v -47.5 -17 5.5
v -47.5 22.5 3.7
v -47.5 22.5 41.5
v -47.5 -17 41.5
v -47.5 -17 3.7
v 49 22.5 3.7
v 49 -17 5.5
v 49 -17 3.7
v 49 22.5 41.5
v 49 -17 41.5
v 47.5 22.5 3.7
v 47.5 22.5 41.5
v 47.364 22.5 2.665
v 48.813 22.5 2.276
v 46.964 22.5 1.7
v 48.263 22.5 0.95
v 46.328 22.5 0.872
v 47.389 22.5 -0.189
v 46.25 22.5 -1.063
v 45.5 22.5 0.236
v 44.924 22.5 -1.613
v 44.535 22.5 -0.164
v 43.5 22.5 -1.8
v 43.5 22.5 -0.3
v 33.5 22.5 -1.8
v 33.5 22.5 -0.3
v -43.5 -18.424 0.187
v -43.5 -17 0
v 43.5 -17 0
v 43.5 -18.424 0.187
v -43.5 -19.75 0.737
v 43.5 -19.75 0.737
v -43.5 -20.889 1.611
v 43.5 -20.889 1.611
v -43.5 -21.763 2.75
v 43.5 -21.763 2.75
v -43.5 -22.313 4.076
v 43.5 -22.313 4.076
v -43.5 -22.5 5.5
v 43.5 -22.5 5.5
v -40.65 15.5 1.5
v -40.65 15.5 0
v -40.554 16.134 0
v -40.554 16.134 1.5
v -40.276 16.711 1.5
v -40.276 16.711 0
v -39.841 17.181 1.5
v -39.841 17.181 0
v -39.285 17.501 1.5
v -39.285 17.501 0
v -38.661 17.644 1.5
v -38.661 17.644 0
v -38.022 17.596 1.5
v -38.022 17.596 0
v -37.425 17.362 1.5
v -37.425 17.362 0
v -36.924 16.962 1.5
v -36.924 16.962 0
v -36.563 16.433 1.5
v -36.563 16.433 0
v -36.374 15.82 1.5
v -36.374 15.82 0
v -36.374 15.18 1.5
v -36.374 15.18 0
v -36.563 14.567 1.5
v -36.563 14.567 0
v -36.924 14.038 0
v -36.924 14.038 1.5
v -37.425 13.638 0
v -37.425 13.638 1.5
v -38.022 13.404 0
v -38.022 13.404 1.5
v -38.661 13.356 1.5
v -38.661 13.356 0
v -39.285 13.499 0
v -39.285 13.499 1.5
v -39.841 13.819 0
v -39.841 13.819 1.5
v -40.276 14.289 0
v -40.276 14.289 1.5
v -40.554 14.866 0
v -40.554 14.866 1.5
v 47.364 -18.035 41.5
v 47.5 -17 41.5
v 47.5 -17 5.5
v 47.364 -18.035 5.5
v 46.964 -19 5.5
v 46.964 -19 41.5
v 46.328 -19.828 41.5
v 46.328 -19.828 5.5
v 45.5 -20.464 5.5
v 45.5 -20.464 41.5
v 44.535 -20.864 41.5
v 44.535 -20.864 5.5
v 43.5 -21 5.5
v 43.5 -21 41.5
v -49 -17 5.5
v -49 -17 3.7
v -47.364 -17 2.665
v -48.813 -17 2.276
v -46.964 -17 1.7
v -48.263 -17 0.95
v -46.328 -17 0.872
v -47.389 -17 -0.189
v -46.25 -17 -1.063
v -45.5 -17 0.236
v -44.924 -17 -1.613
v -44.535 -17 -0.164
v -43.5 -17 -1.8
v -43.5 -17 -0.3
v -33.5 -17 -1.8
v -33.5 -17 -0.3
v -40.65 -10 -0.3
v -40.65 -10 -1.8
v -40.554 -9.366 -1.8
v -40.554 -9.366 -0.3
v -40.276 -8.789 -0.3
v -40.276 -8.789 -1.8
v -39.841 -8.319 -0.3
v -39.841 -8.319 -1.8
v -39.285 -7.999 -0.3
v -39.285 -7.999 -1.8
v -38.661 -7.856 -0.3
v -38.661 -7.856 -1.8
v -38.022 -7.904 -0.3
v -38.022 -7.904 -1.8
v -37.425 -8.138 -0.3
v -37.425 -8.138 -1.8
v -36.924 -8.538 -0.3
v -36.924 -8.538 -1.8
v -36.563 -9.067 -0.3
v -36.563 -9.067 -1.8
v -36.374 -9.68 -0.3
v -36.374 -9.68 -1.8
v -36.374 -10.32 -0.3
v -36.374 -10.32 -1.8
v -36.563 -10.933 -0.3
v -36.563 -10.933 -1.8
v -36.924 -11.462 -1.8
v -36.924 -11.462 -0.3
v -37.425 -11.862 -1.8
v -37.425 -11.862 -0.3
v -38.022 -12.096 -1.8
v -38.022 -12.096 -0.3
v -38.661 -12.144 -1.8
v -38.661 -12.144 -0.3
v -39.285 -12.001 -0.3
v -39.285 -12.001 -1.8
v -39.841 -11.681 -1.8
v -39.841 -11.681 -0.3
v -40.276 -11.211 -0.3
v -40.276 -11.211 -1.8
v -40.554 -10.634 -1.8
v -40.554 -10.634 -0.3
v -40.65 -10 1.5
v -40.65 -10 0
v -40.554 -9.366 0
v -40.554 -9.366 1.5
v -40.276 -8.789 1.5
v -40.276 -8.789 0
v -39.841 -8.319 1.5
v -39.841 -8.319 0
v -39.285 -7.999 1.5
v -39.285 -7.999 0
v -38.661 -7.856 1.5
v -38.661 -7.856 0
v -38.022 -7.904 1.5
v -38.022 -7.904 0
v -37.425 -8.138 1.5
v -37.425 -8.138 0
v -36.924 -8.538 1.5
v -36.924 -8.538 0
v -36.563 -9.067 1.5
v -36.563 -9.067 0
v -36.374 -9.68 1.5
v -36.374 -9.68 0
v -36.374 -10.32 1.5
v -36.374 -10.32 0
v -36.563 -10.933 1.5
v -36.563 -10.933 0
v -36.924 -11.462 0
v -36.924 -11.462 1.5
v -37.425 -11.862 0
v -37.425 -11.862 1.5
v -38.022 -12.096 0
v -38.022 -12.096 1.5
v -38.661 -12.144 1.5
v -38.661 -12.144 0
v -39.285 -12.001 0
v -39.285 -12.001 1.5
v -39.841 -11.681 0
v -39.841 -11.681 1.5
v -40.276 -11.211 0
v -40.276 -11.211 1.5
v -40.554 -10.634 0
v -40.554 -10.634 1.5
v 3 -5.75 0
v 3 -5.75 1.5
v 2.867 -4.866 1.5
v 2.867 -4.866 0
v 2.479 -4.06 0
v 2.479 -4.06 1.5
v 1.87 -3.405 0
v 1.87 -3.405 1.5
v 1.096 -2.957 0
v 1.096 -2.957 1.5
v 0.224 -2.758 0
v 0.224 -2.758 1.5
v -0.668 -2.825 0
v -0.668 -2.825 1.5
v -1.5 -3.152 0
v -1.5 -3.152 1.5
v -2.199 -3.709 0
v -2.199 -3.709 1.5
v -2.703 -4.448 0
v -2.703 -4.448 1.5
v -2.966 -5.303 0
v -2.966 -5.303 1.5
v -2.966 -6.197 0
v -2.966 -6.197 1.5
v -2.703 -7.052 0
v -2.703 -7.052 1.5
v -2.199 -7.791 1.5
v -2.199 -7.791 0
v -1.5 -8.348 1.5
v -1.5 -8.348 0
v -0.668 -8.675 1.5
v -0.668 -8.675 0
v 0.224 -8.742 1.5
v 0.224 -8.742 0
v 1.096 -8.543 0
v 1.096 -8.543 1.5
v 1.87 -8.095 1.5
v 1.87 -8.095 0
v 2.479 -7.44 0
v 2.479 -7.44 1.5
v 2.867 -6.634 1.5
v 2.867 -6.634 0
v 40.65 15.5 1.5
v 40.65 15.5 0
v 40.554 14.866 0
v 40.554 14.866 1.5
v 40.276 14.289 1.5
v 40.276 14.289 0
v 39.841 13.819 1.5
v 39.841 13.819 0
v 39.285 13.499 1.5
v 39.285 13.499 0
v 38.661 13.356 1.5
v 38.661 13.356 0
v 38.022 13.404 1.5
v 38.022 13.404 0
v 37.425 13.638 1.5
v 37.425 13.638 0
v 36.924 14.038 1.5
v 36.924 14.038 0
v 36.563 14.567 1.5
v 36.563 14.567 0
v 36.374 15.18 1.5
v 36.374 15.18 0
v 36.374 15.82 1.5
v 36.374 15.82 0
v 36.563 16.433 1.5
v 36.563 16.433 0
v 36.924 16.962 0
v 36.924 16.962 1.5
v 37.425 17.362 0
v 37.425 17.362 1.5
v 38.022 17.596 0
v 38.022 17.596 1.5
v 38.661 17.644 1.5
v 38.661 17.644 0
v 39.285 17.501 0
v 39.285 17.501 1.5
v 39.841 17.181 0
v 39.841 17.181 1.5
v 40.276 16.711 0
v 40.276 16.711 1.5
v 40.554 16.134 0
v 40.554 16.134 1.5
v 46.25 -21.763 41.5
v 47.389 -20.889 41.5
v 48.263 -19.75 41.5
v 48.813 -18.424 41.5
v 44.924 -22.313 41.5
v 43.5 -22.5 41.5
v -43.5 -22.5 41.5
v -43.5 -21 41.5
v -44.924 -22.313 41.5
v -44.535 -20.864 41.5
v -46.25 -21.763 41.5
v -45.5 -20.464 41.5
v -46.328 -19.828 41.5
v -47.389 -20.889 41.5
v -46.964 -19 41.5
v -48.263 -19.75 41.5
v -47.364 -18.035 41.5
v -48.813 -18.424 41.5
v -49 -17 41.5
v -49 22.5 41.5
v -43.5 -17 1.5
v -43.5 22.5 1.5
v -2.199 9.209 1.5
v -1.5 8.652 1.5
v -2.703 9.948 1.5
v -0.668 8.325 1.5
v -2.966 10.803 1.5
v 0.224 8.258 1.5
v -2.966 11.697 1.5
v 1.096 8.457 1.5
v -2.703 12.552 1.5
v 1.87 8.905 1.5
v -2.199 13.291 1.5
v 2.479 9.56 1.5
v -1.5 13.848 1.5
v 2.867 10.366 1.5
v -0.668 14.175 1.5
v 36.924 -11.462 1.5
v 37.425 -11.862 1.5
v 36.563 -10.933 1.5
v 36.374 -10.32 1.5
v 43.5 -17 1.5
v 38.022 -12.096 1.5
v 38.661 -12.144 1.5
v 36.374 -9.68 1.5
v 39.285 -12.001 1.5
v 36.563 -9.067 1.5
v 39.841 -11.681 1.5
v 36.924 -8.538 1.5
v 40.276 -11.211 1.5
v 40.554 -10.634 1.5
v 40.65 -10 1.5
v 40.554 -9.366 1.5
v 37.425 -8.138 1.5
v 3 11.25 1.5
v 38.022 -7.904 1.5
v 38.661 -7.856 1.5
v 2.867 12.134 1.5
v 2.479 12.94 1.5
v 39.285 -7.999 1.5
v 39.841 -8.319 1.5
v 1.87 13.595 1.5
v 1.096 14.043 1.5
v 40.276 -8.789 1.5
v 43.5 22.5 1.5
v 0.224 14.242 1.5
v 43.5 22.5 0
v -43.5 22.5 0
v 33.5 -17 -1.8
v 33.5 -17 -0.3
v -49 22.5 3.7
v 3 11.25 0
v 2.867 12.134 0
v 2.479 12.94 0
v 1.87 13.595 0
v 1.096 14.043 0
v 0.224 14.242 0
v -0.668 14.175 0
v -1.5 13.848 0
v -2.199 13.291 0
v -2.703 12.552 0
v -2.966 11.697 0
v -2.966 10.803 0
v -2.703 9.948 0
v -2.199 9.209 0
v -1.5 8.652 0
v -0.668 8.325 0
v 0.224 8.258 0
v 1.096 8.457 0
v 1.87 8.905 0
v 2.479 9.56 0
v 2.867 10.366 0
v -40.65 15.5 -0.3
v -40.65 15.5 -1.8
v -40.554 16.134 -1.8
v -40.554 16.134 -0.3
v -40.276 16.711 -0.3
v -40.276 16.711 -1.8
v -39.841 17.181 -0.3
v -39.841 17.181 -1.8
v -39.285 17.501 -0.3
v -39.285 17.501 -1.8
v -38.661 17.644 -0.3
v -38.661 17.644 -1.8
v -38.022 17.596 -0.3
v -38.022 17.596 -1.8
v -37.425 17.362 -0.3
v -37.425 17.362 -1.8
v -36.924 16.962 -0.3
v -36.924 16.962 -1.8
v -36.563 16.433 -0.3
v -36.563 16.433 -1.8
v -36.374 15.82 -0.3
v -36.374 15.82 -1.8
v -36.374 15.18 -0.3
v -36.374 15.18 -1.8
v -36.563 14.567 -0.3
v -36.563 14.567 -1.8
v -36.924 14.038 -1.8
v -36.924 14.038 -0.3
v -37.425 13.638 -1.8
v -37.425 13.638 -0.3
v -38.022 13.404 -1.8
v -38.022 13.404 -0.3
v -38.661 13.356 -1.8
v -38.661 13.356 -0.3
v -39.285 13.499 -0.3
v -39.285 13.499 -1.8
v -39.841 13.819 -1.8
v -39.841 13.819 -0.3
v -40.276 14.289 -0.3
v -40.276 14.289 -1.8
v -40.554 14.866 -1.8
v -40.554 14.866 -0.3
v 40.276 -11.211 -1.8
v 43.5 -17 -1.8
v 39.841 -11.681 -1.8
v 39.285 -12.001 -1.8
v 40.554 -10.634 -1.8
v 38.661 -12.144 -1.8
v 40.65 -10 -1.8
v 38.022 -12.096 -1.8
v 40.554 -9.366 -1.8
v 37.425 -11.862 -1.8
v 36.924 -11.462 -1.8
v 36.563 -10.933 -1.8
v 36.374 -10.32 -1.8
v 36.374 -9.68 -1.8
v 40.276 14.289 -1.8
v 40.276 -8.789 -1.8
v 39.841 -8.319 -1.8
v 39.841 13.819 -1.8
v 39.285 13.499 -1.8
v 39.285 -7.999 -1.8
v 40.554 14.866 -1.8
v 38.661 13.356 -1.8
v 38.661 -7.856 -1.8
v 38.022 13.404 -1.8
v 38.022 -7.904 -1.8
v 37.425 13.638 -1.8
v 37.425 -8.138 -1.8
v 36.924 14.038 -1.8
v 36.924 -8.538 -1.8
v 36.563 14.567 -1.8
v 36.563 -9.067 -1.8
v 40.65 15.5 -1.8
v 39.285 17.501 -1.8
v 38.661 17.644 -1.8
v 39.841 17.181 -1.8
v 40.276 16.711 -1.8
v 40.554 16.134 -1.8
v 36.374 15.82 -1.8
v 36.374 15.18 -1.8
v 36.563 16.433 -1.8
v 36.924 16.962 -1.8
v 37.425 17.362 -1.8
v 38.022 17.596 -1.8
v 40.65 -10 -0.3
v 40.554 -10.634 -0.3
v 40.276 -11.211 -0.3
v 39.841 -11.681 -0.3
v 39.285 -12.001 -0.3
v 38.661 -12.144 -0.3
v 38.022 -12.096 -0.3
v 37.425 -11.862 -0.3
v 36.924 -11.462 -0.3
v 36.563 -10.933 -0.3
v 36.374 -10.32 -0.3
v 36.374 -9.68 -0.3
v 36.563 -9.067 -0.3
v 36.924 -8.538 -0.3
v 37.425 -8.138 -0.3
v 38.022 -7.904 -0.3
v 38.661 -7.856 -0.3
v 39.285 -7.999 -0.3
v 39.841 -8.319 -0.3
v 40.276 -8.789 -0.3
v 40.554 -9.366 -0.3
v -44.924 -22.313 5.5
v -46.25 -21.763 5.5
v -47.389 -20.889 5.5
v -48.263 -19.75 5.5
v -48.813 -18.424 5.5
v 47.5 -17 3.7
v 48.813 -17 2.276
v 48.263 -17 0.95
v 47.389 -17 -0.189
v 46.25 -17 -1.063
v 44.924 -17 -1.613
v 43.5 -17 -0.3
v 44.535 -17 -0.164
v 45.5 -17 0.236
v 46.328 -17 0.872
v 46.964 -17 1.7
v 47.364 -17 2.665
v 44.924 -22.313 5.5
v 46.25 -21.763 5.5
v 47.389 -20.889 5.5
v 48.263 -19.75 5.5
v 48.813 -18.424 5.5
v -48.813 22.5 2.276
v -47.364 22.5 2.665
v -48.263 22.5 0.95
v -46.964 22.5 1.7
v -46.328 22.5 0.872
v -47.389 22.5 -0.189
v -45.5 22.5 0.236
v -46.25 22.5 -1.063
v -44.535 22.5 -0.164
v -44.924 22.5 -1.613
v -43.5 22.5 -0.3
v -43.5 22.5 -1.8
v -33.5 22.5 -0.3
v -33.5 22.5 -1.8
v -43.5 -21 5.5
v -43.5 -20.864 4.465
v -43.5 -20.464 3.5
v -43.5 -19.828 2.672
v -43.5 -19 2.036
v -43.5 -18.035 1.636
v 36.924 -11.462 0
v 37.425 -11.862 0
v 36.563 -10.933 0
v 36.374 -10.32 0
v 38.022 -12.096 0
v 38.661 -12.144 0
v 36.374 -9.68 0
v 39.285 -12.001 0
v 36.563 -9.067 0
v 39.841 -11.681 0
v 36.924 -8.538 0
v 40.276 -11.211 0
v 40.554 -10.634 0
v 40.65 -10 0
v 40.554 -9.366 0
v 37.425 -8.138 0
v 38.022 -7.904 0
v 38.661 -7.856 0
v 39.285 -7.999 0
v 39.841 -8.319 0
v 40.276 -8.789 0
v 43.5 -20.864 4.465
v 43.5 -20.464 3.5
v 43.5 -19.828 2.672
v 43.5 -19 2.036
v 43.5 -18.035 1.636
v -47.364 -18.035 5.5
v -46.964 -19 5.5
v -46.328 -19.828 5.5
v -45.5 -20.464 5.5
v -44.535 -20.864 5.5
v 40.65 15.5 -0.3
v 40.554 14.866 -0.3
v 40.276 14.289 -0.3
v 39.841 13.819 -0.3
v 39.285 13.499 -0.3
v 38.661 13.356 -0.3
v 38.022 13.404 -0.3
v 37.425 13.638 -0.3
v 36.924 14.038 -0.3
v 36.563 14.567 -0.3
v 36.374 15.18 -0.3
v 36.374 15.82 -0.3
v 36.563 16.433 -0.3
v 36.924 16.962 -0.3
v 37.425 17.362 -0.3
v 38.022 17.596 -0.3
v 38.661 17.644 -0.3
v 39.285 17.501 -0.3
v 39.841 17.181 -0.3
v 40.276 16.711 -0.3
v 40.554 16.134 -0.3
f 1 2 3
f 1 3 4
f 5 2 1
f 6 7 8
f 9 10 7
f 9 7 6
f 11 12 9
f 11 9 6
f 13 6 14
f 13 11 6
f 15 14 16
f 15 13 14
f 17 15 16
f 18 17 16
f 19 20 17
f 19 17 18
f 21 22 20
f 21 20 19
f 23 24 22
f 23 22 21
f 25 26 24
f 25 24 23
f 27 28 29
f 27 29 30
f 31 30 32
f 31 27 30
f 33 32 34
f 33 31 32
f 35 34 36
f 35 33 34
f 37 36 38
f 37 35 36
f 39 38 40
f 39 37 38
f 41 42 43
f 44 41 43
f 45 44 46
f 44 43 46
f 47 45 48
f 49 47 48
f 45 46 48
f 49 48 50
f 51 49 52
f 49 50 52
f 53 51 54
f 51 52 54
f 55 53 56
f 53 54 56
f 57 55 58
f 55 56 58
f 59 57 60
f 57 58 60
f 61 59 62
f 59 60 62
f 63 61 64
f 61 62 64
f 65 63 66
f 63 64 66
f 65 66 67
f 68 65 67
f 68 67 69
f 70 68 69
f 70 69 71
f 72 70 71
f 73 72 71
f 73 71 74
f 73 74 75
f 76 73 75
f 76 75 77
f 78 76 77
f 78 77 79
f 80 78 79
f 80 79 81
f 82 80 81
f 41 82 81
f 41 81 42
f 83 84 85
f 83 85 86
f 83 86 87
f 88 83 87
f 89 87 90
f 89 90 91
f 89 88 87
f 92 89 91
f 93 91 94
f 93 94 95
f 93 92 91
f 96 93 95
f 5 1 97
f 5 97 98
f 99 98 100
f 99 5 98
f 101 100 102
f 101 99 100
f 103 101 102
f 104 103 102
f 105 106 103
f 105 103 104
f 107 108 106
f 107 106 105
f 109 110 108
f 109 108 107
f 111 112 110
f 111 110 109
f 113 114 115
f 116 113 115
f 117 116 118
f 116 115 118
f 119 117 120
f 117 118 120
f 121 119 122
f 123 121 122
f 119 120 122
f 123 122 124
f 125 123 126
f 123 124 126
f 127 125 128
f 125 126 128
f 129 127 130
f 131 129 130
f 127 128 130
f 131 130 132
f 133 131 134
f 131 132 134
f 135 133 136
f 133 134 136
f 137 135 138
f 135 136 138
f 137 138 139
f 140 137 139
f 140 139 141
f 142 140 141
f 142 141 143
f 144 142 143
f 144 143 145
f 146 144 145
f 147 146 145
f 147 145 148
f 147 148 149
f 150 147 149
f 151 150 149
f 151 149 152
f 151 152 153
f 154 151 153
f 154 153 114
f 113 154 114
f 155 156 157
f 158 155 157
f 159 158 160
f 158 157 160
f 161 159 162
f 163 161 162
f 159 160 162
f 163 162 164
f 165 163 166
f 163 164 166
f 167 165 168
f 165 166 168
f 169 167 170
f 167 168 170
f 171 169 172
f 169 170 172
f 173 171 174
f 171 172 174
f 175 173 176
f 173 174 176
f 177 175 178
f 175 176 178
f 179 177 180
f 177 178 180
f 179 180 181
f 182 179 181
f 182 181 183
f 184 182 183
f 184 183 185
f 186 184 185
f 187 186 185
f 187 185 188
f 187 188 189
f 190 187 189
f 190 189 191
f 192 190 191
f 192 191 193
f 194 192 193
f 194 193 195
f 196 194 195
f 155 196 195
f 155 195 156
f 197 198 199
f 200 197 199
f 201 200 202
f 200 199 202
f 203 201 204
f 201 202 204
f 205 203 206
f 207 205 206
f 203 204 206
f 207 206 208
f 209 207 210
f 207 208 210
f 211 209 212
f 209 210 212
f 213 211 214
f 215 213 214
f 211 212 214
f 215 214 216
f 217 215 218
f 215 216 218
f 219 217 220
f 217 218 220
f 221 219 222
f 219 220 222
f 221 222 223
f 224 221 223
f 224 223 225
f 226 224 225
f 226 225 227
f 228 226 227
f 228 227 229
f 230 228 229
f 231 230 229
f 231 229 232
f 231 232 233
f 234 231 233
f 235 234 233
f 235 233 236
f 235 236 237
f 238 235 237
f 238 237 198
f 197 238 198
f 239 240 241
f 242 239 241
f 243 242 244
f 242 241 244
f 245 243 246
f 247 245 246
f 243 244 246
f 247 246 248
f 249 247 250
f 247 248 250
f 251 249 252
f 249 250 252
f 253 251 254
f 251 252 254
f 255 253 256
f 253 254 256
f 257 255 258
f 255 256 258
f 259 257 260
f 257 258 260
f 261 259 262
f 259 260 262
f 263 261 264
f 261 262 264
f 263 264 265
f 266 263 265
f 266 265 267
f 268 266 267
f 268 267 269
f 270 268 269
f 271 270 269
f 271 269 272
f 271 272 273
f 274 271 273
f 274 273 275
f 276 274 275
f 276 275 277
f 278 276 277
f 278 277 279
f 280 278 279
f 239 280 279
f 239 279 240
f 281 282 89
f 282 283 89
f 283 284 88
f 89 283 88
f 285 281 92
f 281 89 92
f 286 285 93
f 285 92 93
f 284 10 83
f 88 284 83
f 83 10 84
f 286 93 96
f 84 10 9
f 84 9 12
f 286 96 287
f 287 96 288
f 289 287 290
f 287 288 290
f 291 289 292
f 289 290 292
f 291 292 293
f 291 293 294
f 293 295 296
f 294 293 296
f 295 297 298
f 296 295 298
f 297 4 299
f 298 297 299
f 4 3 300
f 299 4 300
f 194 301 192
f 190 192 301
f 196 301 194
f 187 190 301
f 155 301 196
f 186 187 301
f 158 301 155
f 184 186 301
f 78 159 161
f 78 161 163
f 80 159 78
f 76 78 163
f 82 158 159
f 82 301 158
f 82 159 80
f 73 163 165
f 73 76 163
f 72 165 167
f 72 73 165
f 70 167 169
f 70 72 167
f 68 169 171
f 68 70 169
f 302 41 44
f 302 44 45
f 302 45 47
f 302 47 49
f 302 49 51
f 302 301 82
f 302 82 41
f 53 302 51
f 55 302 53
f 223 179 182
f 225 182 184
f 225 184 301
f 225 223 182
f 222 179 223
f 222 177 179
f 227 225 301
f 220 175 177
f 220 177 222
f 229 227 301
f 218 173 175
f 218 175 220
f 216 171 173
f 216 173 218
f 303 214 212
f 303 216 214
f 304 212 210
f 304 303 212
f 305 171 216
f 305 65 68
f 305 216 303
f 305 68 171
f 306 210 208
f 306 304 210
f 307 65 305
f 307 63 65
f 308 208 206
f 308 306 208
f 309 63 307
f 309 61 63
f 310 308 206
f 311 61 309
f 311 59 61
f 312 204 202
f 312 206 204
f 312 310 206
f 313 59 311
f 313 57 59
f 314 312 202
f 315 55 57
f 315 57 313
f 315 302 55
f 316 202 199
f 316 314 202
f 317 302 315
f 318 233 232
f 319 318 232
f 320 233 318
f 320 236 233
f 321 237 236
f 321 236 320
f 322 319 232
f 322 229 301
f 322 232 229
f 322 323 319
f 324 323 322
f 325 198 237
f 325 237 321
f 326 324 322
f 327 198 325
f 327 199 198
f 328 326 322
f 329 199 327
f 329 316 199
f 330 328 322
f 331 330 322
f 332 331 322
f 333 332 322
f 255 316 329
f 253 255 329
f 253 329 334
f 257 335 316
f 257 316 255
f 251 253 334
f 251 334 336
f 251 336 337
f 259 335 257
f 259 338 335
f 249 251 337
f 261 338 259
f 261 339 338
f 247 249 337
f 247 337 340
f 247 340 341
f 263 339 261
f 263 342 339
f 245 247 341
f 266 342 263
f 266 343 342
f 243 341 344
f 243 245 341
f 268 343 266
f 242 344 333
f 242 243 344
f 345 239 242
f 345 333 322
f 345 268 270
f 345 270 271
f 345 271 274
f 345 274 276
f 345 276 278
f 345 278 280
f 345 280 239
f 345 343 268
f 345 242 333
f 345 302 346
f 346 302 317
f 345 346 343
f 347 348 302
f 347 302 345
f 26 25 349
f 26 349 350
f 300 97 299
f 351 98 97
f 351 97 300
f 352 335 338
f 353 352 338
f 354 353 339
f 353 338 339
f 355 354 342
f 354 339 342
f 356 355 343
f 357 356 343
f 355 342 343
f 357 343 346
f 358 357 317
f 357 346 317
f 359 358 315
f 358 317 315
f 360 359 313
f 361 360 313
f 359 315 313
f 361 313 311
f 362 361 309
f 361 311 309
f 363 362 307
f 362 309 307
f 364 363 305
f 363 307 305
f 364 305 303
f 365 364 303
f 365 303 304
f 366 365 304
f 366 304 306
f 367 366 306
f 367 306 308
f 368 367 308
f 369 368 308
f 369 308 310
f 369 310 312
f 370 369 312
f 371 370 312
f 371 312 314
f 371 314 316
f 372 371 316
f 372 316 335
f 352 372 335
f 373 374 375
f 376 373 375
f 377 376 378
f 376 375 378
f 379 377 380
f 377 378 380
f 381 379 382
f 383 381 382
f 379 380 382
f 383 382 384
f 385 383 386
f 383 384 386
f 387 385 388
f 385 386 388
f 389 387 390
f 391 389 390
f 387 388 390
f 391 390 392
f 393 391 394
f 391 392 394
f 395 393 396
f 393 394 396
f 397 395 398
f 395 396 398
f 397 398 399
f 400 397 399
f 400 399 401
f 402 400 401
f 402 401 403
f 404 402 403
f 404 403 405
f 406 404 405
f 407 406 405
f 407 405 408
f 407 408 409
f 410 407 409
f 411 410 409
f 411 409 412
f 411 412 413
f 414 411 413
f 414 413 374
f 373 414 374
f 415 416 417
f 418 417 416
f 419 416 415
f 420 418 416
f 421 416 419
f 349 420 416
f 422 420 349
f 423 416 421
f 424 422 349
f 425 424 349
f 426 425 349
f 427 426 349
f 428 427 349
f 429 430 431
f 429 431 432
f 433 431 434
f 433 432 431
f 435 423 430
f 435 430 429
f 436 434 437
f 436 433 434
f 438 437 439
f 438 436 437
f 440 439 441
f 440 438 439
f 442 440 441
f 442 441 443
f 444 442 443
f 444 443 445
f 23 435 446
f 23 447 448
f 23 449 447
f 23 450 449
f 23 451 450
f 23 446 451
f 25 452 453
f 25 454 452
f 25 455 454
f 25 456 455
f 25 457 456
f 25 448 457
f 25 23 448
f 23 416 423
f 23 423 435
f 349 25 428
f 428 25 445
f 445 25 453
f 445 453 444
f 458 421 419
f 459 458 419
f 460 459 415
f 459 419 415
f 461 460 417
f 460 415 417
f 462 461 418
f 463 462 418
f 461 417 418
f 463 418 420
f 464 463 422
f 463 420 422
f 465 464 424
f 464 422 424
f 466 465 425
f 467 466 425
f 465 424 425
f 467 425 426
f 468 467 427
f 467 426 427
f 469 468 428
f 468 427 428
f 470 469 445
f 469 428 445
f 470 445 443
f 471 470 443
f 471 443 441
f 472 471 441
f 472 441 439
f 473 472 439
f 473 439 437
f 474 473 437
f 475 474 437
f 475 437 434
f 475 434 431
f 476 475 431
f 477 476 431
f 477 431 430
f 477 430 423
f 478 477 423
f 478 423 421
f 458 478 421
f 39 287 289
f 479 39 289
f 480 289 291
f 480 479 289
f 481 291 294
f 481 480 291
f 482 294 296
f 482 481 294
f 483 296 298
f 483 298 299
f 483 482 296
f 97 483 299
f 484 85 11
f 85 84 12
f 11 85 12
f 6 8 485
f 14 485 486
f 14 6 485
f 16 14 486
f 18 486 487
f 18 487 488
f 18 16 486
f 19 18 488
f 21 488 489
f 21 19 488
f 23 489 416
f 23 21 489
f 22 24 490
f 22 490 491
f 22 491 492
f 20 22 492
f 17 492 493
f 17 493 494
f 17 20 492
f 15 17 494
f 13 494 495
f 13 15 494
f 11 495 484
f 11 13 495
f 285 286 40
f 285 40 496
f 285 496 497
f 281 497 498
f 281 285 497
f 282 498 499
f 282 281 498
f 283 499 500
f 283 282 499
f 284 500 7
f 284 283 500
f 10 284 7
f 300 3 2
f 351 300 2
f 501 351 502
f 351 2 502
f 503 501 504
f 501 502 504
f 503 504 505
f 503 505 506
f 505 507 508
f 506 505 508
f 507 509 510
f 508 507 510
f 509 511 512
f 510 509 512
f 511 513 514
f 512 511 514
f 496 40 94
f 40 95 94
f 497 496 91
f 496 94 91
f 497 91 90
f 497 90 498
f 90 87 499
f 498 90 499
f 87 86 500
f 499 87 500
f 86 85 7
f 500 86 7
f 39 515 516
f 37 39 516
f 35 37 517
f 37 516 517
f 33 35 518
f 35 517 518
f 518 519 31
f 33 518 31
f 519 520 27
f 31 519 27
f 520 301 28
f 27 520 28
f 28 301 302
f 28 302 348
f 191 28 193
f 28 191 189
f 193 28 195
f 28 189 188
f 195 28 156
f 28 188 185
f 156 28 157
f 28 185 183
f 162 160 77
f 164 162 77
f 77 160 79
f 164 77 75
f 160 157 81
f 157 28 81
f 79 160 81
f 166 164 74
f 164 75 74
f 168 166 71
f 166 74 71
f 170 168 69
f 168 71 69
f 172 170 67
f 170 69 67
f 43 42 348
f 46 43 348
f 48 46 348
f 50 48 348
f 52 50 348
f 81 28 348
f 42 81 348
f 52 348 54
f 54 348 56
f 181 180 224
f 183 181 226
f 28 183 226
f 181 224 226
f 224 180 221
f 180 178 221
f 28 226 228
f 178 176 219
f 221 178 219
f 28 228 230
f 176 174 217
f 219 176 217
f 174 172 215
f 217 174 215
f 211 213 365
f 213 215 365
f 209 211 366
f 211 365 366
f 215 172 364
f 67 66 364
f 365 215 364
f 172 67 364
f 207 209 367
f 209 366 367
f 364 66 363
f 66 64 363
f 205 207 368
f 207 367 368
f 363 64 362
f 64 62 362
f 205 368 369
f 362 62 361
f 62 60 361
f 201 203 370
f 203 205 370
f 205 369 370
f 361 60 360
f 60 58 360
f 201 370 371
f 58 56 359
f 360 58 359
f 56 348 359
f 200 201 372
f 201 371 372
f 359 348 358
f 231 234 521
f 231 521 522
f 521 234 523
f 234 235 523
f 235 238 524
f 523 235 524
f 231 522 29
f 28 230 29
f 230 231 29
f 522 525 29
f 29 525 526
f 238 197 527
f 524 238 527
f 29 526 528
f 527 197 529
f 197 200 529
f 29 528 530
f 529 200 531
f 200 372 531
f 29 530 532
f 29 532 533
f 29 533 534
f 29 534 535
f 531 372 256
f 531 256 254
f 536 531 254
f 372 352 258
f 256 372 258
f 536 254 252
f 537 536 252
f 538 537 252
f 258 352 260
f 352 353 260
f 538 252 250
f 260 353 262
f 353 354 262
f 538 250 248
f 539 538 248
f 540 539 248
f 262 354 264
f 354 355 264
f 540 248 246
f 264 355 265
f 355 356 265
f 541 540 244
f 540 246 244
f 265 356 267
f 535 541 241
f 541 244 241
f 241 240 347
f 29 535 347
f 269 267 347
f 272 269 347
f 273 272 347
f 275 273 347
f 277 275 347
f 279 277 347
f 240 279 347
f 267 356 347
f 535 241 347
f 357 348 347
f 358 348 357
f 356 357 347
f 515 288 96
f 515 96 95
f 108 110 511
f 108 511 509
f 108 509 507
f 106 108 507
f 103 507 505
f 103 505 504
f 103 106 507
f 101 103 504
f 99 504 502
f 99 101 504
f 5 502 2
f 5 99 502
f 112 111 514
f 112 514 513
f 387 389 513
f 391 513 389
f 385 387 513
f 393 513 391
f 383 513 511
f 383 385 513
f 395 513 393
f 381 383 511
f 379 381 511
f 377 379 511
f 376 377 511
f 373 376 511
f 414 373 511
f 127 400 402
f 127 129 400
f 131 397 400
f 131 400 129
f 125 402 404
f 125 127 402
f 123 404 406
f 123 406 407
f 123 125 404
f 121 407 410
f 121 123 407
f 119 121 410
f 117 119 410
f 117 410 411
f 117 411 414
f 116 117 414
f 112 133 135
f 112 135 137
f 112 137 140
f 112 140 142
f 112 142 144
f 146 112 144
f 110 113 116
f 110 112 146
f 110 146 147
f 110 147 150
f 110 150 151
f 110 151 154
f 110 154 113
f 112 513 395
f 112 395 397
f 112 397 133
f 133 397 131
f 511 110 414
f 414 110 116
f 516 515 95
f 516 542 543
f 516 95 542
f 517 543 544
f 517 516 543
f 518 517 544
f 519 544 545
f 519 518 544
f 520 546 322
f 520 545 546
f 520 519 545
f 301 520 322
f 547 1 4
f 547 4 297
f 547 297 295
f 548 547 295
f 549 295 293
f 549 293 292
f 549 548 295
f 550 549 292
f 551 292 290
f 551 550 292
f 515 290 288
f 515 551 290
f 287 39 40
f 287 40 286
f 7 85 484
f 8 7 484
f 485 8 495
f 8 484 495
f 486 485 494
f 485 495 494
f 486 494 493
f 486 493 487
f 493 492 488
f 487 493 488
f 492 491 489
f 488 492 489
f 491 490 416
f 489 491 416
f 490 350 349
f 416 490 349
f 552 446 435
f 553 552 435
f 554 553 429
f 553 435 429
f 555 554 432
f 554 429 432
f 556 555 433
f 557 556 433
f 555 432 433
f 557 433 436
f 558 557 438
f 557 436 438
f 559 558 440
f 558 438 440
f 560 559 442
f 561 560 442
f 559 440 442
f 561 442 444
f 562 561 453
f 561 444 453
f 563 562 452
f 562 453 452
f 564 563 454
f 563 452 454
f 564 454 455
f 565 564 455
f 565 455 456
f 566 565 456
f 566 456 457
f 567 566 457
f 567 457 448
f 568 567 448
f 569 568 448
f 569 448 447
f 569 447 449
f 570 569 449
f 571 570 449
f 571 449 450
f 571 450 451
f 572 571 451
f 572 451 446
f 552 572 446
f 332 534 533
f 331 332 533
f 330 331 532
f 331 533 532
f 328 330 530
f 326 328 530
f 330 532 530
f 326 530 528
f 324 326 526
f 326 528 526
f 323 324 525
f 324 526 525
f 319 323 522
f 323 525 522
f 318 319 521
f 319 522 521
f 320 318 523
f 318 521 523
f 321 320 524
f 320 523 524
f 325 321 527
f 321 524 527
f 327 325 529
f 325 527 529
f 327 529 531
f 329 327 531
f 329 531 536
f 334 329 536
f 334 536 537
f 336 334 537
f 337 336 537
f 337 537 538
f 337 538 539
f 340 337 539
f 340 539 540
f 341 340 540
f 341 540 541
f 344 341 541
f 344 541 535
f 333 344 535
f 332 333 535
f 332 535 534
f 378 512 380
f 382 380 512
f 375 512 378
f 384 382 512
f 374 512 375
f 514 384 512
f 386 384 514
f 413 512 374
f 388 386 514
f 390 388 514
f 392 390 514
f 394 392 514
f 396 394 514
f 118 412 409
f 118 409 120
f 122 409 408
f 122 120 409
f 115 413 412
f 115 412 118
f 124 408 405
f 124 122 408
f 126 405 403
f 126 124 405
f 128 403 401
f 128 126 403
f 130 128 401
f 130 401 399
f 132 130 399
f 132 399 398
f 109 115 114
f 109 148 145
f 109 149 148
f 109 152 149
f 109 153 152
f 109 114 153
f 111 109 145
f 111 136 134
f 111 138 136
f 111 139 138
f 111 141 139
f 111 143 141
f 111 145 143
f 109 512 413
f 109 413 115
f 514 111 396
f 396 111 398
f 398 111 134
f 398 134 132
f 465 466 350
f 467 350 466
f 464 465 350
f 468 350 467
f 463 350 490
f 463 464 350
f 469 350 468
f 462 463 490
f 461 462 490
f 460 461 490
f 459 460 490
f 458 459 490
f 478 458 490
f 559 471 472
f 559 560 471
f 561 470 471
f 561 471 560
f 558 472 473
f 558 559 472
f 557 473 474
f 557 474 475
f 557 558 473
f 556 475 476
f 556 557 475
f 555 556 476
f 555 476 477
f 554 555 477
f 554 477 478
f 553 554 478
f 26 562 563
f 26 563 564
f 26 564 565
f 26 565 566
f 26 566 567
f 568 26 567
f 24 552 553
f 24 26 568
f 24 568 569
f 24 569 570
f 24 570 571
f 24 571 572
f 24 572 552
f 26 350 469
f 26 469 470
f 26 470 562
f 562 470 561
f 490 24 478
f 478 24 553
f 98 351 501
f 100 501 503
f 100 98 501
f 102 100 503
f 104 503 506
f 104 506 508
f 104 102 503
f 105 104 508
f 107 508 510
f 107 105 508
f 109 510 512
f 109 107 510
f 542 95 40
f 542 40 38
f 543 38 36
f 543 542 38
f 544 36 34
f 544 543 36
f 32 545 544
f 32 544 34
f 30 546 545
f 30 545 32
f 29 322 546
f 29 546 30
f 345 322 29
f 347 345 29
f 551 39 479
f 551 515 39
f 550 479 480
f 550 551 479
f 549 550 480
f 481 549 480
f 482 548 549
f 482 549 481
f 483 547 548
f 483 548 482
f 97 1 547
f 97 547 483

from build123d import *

# Parameters (mm, degrees)
SKETCH1_W                      = 98
SKETCH1_H                      = 45
BOSS_EXTRUDE1_DEPTH            = 10
CONVERT_SOLID1_START           = 1.5
CONVERT_SOLID1_OUTLINE_W       = 98
CONVERT_SOLID1_OUTLINE_H       = 45
CONVERT_SOLID1_DEPTH           = 8.5
EDGE_FLANGE1_STRIP_W           = 14
EDGE_FLANGE1_STRIP_H           = 1.5
EDGE_FLANGE1_STRIP_CUT_DEPTH   = 98
EDGE_FLANGE1_DEPTH             = 98
EDGE_FLANGE2_STRIP_W           = 14
EDGE_FLANGE2_STRIP_H           = 1.5
EDGE_FLANGE2_STRIP_CUT_DEPTH   = 36
EDGE_FLANGE2_STRIP_2_W         = 14
EDGE_FLANGE2_STRIP_2_H         = 1.5
EDGE_FLANGE2_STRIP_CUT_2_DEPTH = 36
EDGE_FLANGE2_DEPTH             = 36
EDGE_FLANGE2_BEND_DEPTH        = 36
SKETCH17_W                     = 5.5
SKETCH17_H                     = 5.5
CUT_EXTRUDE1_DEPTH             = 79.41077732
SKETCH18_W                     = 1.5
SKETCH18_H                     = 39.5
BOSS_EXTRUDE2_DEPTH            = 7.3
EDGE_FLANGE3_STRIP_W           = 14
EDGE_FLANGE3_STRIP_H           = 1.5
EDGE_FLANGE3_STRIP_CUT_DEPTH   = 39.5
EDGE_FLANGE3_STRIP_2_W         = 14
EDGE_FLANGE3_STRIP_2_H         = 1.5
EDGE_FLANGE3_STRIP_CUT_2_DEPTH = 39.5
EDGE_FLANGE3_DEPTH             = 39.5
EDGE_FLANGE3_BEND_DEPTH        = 39.5
SKETCH25_R                     = 2.15
CUT_EXTRUDE2_DEPTH             = 70.153018734
SKETCH26_R                     = 3
CUT_EXTRUDE3_DEPTH             = 10


# Read off the part's stored shape, not the designer's step: Convert-Solid1
# Sheet-metal steps are written as plain solids
with BuildPart() as part:
    # Sketch1 → Boss-Extrude1 (new body)
    with BuildSketch(Plane.XY):
        Rectangle(SKETCH1_W, SKETCH1_H)
    extrude(amount=BOSS_EXTRUDE1_DEPTH)

    # Convert-Solid1 outline → Convert-Solid1 (cut)
    with BuildSketch(Plane.XY.offset(CONVERT_SOLID1_START)):
        Rectangle(CONVERT_SOLID1_OUTLINE_W, CONVERT_SOLID1_OUTLINE_H)
    extrude(amount=CONVERT_SOLID1_DEPTH, mode=Mode.SUBTRACT)

    # Edge-Flange1 strip (across the edge) → Edge-Flange1 strip cut (cut)
    with BuildSketch(Plane(origin=(-49, -22.5, 1.5), x_dir=(0, 1, 0), z_dir=(1, 0, 0))):
        with Locations((-1.5, -0.75)):
            Rectangle(EDGE_FLANGE1_STRIP_W, EDGE_FLANGE1_STRIP_H)
    extrude(amount=EDGE_FLANGE1_STRIP_CUT_DEPTH, mode=Mode.SUBTRACT)

    # Edge-Flange1 section (across the edge) → Edge-Flange1 (add)
    with BuildSketch(Plane(origin=(-49, -22.5, 1.5), x_dir=(0, 1, 0), z_dir=(1, 0, 0))):
        with BuildLine():
            Line((0, 4), (0, 40))
            Line((0, 40), (1.5, 40))
            Line((1.5, 40), (1.5, 4))
            ThreePointArc((1.5, 4), (2.671572875, 1.171572875), (5.5, 0))
            Line((5.5, 0), (5.5, -1.5))
            ThreePointArc((5.5, -1.5), (1.610912703, 0.110912703), (0, 4))
        make_face()
    extrude(amount=EDGE_FLANGE1_DEPTH)

    # Edge-Flange2 strip (across the edge) → Edge-Flange2 strip cut (cut)
    with BuildSketch(Plane(origin=(49, -21, 41.5), x_dir=(-1, 0, 0), z_dir=(0, 0, -1))):
        with Locations((-1.5, -0.75)):
            Rectangle(EDGE_FLANGE2_STRIP_W, EDGE_FLANGE2_STRIP_H)
    extrude(amount=EDGE_FLANGE2_STRIP_CUT_DEPTH, mode=Mode.SUBTRACT)

    # Edge-Flange2 strip 2 (across the edge) → Edge-Flange2 strip cut 2 (cut)
    with BuildSketch(Plane(origin=(-49, -21, 5.5), x_dir=(1, 0, 0), z_dir=(0, 0, 1))):
        with Locations((-1.5, -0.75)):
            Rectangle(EDGE_FLANGE2_STRIP_2_W, EDGE_FLANGE2_STRIP_2_H)
    extrude(amount=EDGE_FLANGE2_STRIP_CUT_2_DEPTH, mode=Mode.SUBTRACT)

    # Edge-Flange2 section (across the edge) → Edge-Flange2 (add)
    with BuildSketch(Plane(origin=(49, -21, 41.5), x_dir=(-1, 0, 0), z_dir=(0, 0, -1))):
        with BuildLine():
            Line((0, 4), (0, 43.5))
            Line((0, 43.5), (1.5, 43.5))
            Line((1.5, 43.5), (1.5, 4))
            ThreePointArc((1.5, 4), (2.671572875, 1.171572875), (5.5, 0))
            Line((5.5, 0), (5.5, -1.5))
            ThreePointArc((5.5, -1.5), (1.610912703, 0.110912703), (0, 4))
        make_face()
    extrude(amount=EDGE_FLANGE2_DEPTH)

    # Edge-Flange2 section 2 (across the edge) → Edge-Flange2 bend (add)
    with BuildSketch(Plane(origin=(-49, -21, 5.5), x_dir=(1, 0, 0), z_dir=(0, 0, 1))):
        with BuildLine():
            Line((0, 4), (0, 43.5))
            Line((0, 43.5), (1.5, 43.5))
            Line((1.5, 43.5), (1.5, 4))
            ThreePointArc((1.5, 4), (2.671572875, 1.171572875), (5.5, 0))
            Line((5.5, 0), (5.5, -1.5))
            ThreePointArc((5.5, -1.5), (1.610912703, 0.110912703), (0, 4))
        make_face()
    extrude(amount=EDGE_FLANGE2_BEND_DEPTH)

    # Sketch17 → Cut-Extrude1 (cut, through all)
    with BuildSketch(Plane(origin=(0, 22.5, 0), x_dir=(1, 0, 0), z_dir=(0, 1, 0))):
        with Locations((-46.25, -2.75)):
            Rectangle(SKETCH17_W, SKETCH17_H)
        with Locations((46.25, -2.75)):
            Rectangle(SKETCH17_W, SKETCH17_H)
    extrude(amount=-CUT_EXTRUDE1_DEPTH, mode=Mode.SUBTRACT)

    # Sketch18 → Boss-Extrude2 (add)
    with BuildSketch(Plane(origin=(0, 0, 5.5), x_dir=(-1, 0, 0), z_dir=(0, 0, -1))):
        with Locations((-48.25, 2.75)):
            Rectangle(SKETCH18_W, SKETCH18_H)
        with Locations((48.25, 2.75)):
            Rectangle(SKETCH18_W, SKETCH18_H)
    extrude(amount=BOSS_EXTRUDE2_DEPTH)

    # Edge-Flange3 strip (across the edge) → Edge-Flange3 strip cut (cut)
    with BuildSketch(Plane(origin=(47.5, 22.5, -1.8), x_dir=(0, 0, 1), z_dir=(0, -1, 0))):
        with Locations((-1.5, -0.75)):
            Rectangle(EDGE_FLANGE3_STRIP_W, EDGE_FLANGE3_STRIP_H)
    extrude(amount=EDGE_FLANGE3_STRIP_CUT_DEPTH, mode=Mode.SUBTRACT)

    # Edge-Flange3 strip 2 (across the edge) → Edge-Flange3 strip cut 2 (cut)
    with BuildSketch(Plane(origin=(-47.5, -17, -1.8), x_dir=(0, 0, 1), z_dir=(0, 1, 0))):
        with Locations((-1.5, -0.75)):
            Rectangle(EDGE_FLANGE3_STRIP_2_W, EDGE_FLANGE3_STRIP_2_H)
    extrude(amount=EDGE_FLANGE3_STRIP_CUT_2_DEPTH, mode=Mode.SUBTRACT)

    # Edge-Flange3 section (across the edge) → Edge-Flange3 (add)
    with BuildSketch(Plane(origin=(47.5, 22.5, -1.8), x_dir=(0, 0, 1), z_dir=(0, -1, 0))):
        with BuildLine():
            Line((0, 4), (0, 14))
            Line((0, 14), (1.5, 14))
            Line((1.5, 14), (1.5, 4))
            ThreePointArc((1.5, 4), (2.671572875, 1.171572875), (5.5, 0))
            Line((5.5, 0), (5.5, -1.5))
            ThreePointArc((5.5, -1.5), (1.610912703, 0.110912703), (0, 4))
        make_face()
    extrude(amount=EDGE_FLANGE3_DEPTH)

    # Edge-Flange3 section 2 (across the edge) → Edge-Flange3 bend (add)
    with BuildSketch(Plane(origin=(-47.5, -17, -1.8), x_dir=(0, 0, 1), z_dir=(0, 1, 0))):
        with BuildLine():
            Line((0, 4), (0, 14))
            Line((0, 14), (1.5, 14))
            Line((1.5, 14), (1.5, 4))
            ThreePointArc((1.5, 4), (2.671572875, 1.171572875), (5.5, 0))
            Line((5.5, 0), (5.5, -1.5))
            ThreePointArc((5.5, -1.5), (1.610912703, 0.110912703), (0, 4))
        make_face()
    extrude(amount=EDGE_FLANGE3_BEND_DEPTH)

    # Sketch25 → Cut-Extrude2 (cut, through all)
    with BuildSketch(Plane(origin=(0, 0, -1.8), x_dir=(-1, 0, 0), z_dir=(0, 0, -1))):
        with Locations((38.5, 15.5)):
            Circle(SKETCH25_R)
        with Locations((38.5, -10)):
            Circle(SKETCH25_R)
        with Locations(Location((-38.5, -10, 0), (0, 0, 180))):
            Circle(SKETCH25_R)
        with Locations(Location((-38.5, 15.5, 0), (0, 0, 180))):
            Circle(SKETCH25_R)
    extrude(amount=-CUT_EXTRUDE2_DEPTH, mode=Mode.SUBTRACT)

    # Sketch26 → Cut-Extrude3 (cut)
    with BuildSketch(Plane.XY.offset(1.5)):
        with Locations((0, 11.25)):
            Circle(SKETCH26_R)
        with Locations((0, -5.75)):
            Circle(SKETCH26_R)
    extrude(amount=-CUT_EXTRUDE3_DEPTH, mode=Mode.SUBTRACT)


solid = part.part
